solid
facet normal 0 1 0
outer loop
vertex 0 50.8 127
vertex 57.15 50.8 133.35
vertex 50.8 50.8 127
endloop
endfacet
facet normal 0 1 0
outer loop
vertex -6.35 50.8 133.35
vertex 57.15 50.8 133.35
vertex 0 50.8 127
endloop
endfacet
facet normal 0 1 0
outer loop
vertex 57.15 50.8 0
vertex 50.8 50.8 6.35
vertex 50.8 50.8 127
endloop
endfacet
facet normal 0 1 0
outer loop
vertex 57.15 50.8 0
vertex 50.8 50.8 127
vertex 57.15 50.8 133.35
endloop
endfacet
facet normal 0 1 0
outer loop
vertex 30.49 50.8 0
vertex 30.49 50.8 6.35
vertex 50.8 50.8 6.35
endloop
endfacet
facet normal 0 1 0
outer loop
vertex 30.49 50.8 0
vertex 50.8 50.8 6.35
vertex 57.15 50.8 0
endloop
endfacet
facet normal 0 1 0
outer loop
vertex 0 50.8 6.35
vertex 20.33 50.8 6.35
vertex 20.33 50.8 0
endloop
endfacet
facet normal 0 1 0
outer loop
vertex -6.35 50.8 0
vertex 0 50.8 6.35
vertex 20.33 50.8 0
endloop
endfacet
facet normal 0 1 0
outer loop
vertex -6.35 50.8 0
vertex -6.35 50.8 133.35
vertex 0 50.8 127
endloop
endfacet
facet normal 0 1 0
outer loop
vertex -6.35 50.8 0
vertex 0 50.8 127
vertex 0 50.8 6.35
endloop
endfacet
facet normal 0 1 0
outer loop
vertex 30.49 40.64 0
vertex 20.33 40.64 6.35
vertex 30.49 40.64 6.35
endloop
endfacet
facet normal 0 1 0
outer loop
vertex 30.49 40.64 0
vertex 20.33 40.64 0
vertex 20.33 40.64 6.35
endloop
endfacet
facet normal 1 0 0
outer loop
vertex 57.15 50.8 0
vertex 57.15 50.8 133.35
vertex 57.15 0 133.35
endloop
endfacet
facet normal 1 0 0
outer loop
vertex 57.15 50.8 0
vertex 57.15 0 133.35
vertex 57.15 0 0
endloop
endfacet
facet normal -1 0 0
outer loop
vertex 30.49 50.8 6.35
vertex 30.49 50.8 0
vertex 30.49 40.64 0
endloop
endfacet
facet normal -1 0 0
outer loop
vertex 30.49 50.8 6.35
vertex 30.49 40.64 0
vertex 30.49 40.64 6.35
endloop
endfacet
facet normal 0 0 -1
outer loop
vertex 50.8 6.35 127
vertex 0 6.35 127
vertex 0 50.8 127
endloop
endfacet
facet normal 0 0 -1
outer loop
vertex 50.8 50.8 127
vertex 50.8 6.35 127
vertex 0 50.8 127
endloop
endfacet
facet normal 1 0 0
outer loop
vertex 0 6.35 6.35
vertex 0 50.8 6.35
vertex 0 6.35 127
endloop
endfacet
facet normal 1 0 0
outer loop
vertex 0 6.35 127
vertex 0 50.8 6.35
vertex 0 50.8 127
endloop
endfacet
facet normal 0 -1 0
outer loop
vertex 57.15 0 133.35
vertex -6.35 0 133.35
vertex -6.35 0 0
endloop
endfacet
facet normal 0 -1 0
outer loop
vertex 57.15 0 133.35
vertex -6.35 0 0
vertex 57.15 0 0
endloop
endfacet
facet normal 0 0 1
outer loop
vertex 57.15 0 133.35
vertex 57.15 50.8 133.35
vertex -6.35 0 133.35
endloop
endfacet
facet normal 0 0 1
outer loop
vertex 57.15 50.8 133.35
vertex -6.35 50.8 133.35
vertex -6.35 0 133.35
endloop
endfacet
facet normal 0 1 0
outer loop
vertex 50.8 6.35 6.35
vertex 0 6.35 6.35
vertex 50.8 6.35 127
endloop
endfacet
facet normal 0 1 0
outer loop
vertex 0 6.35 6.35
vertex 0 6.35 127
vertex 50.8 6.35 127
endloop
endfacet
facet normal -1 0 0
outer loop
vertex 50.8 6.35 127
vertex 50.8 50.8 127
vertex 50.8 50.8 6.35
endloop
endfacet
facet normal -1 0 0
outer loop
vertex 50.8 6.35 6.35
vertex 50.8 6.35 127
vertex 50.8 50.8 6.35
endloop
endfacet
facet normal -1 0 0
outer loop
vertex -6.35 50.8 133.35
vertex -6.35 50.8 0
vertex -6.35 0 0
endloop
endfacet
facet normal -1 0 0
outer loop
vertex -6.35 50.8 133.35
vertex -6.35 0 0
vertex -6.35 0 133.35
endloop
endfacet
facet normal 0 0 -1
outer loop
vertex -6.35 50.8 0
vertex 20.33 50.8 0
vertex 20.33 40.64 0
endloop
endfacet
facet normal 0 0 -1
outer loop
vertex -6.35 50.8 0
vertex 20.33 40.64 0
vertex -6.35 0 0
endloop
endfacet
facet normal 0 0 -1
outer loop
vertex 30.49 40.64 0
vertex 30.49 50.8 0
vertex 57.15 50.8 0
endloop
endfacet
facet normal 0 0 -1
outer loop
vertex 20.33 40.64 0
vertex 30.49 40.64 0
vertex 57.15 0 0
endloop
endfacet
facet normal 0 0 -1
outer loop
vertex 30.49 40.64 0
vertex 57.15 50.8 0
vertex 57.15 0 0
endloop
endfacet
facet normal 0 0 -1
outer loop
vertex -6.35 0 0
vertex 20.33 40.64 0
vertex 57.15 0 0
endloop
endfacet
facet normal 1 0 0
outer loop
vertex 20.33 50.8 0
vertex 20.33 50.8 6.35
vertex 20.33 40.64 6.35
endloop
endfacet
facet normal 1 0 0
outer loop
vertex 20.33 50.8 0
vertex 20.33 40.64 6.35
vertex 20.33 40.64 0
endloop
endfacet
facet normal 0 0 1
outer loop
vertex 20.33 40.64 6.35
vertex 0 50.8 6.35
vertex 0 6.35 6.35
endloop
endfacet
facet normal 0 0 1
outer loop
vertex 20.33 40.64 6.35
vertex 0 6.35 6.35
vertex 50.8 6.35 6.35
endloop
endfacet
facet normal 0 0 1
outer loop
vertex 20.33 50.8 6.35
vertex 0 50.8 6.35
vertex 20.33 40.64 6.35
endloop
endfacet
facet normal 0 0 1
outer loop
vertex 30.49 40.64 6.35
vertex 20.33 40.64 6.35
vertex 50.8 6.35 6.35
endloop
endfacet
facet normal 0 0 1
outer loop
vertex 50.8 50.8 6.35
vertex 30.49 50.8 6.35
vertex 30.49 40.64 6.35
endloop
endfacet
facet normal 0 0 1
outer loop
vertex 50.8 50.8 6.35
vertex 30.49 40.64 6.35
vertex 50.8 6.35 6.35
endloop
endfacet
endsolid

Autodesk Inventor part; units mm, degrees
ref_plane "YZ Plane" through (0, 0, 0) normal (1, 0, 0) x (0, 1, 0)
ref_plane "XZ Plane" through (0, 0, 0) normal (0, 1, 0) x (-1, 0, 0)
ref_plane "XY Plane" through (0, 0, 0) normal (0, 0, 1) x (1, 0, 0)
sketch "Sketch1" plane through (0, 0, 0) normal (0, 0, 1) x (1, 0, 0)
  line L0 (0, 0) -> (50.8, 0)
  line L1 (50.8, 0) -> (50.8, 50.8)
  line L2 (50.8, 50.8) -> (0, 50.8)
  line L3 (0, 50.8) -> (0, 0)
  dimension "d0" = 50.8
  dimension "d1" = 50.8
extrude "Extrusion1" add sketch "Sketch1" along normal blind 6.35
sketch "Sketch2" plane through (0, 50.8, 0) normal (0, 1, 0) x (1, 0, 0)
  line L0 (0, 0) -> (50.8, 0) projected
  line L1 (0, -6.35) -> (50.8, -6.35) projected
  line L2 (20.3299, 0) -> (30.4899, 0)
  line L3 (30.4899, 0) -> (30.4899, -6.35)
  line L4 (30.4899, -6.35) -> (20.3299, -6.35)
  line L5 (20.3299, -6.35) -> (20.3299, 0)
  dimension "d4" = 10.16
extrude "Extrusion2" cut sketch "Sketch2" against normal blind 10.16
sketch "Sketch3" plane through (50.8, 0, 0) normal (1, 0, 0) x (0, 0, -1)
  line L0 (0, 0) -> (-6.35, 0) projected
  line L1 (0, 0) -> (-133.35, 0)
  line L2 (-133.35, 0) -> (-133.35, 50.8)
  line L3 (-133.35, 50.8) -> (0, 50.8)
  line L4 (0, 50.8) -> (0, 0)
  dimension "d7" = 133.35
extrude "Extrusion3" add sketch "Sketch3" along normal blind 6.35
sketch "Sketch4" plane through (0, 0, 0) normal (-1, 0, 0) x (0, 0, 1)
  line L0 (133.35, 0) -> (133.35, 50.8) projected
  line L1 (0, 0) -> (133.35, 0)
  line L2 (133.35, 0) -> (133.35, 50.8)
  line L3 (133.35, 50.8) -> (0, 50.8)
  line L4 (0, 50.8) -> (0, 0)
extrude "Extrusion4" add sketch "Sketch4" along normal blind 6.35
sketch "Sketch5" plane through (0, 0, 0) normal (1, 0, 0) x (0, 0, -1)
  line L0 (-6.35, 0) -> (-133.35, 0) projected
  line L1 (-133.35, 50.8) -> (-6.35, 50.8) projected
  line L2 (-133.35, 0) -> (-127, 0)
  line L3 (-127, 0) -> (-127, 50.8)
  line L4 (-127, 50.8) -> (-133.35, 50.8)
  line L5 (-133.35, 50.8) -> (-133.35, 0)
  point P0 (0, 0)
  dimension "d12" = 6.35
extrude "Extrusion5" add sketch "Sketch5" along normal blind 50.8
sketch "Sketch6" plane through (57.15, 0, 0) normal (0, -1, 0) x (1, 0, 0)
  line L0 (-57.15, 6.35) -> (-6.35, 6.35) projected
  line L1 (-57.15, 127) -> (-57.15, 6.35) projected
  line L2 (-6.35, 6.35) -> (-57.15, 6.35)
  line L3 (-57.15, 6.35) -> (-57.15, 127)
  line L4 (-57.15, 127) -> (-6.35, 127)
  line L5 (-6.35, 127) -> (-6.35, 6.35)
  point P0 (-57.15, 0)
extrude "Extrusion6" add sketch "Sketch6" against normal blind 6.35
equation "\"d5\" = d4"
properties part number "BatteryHolder"
